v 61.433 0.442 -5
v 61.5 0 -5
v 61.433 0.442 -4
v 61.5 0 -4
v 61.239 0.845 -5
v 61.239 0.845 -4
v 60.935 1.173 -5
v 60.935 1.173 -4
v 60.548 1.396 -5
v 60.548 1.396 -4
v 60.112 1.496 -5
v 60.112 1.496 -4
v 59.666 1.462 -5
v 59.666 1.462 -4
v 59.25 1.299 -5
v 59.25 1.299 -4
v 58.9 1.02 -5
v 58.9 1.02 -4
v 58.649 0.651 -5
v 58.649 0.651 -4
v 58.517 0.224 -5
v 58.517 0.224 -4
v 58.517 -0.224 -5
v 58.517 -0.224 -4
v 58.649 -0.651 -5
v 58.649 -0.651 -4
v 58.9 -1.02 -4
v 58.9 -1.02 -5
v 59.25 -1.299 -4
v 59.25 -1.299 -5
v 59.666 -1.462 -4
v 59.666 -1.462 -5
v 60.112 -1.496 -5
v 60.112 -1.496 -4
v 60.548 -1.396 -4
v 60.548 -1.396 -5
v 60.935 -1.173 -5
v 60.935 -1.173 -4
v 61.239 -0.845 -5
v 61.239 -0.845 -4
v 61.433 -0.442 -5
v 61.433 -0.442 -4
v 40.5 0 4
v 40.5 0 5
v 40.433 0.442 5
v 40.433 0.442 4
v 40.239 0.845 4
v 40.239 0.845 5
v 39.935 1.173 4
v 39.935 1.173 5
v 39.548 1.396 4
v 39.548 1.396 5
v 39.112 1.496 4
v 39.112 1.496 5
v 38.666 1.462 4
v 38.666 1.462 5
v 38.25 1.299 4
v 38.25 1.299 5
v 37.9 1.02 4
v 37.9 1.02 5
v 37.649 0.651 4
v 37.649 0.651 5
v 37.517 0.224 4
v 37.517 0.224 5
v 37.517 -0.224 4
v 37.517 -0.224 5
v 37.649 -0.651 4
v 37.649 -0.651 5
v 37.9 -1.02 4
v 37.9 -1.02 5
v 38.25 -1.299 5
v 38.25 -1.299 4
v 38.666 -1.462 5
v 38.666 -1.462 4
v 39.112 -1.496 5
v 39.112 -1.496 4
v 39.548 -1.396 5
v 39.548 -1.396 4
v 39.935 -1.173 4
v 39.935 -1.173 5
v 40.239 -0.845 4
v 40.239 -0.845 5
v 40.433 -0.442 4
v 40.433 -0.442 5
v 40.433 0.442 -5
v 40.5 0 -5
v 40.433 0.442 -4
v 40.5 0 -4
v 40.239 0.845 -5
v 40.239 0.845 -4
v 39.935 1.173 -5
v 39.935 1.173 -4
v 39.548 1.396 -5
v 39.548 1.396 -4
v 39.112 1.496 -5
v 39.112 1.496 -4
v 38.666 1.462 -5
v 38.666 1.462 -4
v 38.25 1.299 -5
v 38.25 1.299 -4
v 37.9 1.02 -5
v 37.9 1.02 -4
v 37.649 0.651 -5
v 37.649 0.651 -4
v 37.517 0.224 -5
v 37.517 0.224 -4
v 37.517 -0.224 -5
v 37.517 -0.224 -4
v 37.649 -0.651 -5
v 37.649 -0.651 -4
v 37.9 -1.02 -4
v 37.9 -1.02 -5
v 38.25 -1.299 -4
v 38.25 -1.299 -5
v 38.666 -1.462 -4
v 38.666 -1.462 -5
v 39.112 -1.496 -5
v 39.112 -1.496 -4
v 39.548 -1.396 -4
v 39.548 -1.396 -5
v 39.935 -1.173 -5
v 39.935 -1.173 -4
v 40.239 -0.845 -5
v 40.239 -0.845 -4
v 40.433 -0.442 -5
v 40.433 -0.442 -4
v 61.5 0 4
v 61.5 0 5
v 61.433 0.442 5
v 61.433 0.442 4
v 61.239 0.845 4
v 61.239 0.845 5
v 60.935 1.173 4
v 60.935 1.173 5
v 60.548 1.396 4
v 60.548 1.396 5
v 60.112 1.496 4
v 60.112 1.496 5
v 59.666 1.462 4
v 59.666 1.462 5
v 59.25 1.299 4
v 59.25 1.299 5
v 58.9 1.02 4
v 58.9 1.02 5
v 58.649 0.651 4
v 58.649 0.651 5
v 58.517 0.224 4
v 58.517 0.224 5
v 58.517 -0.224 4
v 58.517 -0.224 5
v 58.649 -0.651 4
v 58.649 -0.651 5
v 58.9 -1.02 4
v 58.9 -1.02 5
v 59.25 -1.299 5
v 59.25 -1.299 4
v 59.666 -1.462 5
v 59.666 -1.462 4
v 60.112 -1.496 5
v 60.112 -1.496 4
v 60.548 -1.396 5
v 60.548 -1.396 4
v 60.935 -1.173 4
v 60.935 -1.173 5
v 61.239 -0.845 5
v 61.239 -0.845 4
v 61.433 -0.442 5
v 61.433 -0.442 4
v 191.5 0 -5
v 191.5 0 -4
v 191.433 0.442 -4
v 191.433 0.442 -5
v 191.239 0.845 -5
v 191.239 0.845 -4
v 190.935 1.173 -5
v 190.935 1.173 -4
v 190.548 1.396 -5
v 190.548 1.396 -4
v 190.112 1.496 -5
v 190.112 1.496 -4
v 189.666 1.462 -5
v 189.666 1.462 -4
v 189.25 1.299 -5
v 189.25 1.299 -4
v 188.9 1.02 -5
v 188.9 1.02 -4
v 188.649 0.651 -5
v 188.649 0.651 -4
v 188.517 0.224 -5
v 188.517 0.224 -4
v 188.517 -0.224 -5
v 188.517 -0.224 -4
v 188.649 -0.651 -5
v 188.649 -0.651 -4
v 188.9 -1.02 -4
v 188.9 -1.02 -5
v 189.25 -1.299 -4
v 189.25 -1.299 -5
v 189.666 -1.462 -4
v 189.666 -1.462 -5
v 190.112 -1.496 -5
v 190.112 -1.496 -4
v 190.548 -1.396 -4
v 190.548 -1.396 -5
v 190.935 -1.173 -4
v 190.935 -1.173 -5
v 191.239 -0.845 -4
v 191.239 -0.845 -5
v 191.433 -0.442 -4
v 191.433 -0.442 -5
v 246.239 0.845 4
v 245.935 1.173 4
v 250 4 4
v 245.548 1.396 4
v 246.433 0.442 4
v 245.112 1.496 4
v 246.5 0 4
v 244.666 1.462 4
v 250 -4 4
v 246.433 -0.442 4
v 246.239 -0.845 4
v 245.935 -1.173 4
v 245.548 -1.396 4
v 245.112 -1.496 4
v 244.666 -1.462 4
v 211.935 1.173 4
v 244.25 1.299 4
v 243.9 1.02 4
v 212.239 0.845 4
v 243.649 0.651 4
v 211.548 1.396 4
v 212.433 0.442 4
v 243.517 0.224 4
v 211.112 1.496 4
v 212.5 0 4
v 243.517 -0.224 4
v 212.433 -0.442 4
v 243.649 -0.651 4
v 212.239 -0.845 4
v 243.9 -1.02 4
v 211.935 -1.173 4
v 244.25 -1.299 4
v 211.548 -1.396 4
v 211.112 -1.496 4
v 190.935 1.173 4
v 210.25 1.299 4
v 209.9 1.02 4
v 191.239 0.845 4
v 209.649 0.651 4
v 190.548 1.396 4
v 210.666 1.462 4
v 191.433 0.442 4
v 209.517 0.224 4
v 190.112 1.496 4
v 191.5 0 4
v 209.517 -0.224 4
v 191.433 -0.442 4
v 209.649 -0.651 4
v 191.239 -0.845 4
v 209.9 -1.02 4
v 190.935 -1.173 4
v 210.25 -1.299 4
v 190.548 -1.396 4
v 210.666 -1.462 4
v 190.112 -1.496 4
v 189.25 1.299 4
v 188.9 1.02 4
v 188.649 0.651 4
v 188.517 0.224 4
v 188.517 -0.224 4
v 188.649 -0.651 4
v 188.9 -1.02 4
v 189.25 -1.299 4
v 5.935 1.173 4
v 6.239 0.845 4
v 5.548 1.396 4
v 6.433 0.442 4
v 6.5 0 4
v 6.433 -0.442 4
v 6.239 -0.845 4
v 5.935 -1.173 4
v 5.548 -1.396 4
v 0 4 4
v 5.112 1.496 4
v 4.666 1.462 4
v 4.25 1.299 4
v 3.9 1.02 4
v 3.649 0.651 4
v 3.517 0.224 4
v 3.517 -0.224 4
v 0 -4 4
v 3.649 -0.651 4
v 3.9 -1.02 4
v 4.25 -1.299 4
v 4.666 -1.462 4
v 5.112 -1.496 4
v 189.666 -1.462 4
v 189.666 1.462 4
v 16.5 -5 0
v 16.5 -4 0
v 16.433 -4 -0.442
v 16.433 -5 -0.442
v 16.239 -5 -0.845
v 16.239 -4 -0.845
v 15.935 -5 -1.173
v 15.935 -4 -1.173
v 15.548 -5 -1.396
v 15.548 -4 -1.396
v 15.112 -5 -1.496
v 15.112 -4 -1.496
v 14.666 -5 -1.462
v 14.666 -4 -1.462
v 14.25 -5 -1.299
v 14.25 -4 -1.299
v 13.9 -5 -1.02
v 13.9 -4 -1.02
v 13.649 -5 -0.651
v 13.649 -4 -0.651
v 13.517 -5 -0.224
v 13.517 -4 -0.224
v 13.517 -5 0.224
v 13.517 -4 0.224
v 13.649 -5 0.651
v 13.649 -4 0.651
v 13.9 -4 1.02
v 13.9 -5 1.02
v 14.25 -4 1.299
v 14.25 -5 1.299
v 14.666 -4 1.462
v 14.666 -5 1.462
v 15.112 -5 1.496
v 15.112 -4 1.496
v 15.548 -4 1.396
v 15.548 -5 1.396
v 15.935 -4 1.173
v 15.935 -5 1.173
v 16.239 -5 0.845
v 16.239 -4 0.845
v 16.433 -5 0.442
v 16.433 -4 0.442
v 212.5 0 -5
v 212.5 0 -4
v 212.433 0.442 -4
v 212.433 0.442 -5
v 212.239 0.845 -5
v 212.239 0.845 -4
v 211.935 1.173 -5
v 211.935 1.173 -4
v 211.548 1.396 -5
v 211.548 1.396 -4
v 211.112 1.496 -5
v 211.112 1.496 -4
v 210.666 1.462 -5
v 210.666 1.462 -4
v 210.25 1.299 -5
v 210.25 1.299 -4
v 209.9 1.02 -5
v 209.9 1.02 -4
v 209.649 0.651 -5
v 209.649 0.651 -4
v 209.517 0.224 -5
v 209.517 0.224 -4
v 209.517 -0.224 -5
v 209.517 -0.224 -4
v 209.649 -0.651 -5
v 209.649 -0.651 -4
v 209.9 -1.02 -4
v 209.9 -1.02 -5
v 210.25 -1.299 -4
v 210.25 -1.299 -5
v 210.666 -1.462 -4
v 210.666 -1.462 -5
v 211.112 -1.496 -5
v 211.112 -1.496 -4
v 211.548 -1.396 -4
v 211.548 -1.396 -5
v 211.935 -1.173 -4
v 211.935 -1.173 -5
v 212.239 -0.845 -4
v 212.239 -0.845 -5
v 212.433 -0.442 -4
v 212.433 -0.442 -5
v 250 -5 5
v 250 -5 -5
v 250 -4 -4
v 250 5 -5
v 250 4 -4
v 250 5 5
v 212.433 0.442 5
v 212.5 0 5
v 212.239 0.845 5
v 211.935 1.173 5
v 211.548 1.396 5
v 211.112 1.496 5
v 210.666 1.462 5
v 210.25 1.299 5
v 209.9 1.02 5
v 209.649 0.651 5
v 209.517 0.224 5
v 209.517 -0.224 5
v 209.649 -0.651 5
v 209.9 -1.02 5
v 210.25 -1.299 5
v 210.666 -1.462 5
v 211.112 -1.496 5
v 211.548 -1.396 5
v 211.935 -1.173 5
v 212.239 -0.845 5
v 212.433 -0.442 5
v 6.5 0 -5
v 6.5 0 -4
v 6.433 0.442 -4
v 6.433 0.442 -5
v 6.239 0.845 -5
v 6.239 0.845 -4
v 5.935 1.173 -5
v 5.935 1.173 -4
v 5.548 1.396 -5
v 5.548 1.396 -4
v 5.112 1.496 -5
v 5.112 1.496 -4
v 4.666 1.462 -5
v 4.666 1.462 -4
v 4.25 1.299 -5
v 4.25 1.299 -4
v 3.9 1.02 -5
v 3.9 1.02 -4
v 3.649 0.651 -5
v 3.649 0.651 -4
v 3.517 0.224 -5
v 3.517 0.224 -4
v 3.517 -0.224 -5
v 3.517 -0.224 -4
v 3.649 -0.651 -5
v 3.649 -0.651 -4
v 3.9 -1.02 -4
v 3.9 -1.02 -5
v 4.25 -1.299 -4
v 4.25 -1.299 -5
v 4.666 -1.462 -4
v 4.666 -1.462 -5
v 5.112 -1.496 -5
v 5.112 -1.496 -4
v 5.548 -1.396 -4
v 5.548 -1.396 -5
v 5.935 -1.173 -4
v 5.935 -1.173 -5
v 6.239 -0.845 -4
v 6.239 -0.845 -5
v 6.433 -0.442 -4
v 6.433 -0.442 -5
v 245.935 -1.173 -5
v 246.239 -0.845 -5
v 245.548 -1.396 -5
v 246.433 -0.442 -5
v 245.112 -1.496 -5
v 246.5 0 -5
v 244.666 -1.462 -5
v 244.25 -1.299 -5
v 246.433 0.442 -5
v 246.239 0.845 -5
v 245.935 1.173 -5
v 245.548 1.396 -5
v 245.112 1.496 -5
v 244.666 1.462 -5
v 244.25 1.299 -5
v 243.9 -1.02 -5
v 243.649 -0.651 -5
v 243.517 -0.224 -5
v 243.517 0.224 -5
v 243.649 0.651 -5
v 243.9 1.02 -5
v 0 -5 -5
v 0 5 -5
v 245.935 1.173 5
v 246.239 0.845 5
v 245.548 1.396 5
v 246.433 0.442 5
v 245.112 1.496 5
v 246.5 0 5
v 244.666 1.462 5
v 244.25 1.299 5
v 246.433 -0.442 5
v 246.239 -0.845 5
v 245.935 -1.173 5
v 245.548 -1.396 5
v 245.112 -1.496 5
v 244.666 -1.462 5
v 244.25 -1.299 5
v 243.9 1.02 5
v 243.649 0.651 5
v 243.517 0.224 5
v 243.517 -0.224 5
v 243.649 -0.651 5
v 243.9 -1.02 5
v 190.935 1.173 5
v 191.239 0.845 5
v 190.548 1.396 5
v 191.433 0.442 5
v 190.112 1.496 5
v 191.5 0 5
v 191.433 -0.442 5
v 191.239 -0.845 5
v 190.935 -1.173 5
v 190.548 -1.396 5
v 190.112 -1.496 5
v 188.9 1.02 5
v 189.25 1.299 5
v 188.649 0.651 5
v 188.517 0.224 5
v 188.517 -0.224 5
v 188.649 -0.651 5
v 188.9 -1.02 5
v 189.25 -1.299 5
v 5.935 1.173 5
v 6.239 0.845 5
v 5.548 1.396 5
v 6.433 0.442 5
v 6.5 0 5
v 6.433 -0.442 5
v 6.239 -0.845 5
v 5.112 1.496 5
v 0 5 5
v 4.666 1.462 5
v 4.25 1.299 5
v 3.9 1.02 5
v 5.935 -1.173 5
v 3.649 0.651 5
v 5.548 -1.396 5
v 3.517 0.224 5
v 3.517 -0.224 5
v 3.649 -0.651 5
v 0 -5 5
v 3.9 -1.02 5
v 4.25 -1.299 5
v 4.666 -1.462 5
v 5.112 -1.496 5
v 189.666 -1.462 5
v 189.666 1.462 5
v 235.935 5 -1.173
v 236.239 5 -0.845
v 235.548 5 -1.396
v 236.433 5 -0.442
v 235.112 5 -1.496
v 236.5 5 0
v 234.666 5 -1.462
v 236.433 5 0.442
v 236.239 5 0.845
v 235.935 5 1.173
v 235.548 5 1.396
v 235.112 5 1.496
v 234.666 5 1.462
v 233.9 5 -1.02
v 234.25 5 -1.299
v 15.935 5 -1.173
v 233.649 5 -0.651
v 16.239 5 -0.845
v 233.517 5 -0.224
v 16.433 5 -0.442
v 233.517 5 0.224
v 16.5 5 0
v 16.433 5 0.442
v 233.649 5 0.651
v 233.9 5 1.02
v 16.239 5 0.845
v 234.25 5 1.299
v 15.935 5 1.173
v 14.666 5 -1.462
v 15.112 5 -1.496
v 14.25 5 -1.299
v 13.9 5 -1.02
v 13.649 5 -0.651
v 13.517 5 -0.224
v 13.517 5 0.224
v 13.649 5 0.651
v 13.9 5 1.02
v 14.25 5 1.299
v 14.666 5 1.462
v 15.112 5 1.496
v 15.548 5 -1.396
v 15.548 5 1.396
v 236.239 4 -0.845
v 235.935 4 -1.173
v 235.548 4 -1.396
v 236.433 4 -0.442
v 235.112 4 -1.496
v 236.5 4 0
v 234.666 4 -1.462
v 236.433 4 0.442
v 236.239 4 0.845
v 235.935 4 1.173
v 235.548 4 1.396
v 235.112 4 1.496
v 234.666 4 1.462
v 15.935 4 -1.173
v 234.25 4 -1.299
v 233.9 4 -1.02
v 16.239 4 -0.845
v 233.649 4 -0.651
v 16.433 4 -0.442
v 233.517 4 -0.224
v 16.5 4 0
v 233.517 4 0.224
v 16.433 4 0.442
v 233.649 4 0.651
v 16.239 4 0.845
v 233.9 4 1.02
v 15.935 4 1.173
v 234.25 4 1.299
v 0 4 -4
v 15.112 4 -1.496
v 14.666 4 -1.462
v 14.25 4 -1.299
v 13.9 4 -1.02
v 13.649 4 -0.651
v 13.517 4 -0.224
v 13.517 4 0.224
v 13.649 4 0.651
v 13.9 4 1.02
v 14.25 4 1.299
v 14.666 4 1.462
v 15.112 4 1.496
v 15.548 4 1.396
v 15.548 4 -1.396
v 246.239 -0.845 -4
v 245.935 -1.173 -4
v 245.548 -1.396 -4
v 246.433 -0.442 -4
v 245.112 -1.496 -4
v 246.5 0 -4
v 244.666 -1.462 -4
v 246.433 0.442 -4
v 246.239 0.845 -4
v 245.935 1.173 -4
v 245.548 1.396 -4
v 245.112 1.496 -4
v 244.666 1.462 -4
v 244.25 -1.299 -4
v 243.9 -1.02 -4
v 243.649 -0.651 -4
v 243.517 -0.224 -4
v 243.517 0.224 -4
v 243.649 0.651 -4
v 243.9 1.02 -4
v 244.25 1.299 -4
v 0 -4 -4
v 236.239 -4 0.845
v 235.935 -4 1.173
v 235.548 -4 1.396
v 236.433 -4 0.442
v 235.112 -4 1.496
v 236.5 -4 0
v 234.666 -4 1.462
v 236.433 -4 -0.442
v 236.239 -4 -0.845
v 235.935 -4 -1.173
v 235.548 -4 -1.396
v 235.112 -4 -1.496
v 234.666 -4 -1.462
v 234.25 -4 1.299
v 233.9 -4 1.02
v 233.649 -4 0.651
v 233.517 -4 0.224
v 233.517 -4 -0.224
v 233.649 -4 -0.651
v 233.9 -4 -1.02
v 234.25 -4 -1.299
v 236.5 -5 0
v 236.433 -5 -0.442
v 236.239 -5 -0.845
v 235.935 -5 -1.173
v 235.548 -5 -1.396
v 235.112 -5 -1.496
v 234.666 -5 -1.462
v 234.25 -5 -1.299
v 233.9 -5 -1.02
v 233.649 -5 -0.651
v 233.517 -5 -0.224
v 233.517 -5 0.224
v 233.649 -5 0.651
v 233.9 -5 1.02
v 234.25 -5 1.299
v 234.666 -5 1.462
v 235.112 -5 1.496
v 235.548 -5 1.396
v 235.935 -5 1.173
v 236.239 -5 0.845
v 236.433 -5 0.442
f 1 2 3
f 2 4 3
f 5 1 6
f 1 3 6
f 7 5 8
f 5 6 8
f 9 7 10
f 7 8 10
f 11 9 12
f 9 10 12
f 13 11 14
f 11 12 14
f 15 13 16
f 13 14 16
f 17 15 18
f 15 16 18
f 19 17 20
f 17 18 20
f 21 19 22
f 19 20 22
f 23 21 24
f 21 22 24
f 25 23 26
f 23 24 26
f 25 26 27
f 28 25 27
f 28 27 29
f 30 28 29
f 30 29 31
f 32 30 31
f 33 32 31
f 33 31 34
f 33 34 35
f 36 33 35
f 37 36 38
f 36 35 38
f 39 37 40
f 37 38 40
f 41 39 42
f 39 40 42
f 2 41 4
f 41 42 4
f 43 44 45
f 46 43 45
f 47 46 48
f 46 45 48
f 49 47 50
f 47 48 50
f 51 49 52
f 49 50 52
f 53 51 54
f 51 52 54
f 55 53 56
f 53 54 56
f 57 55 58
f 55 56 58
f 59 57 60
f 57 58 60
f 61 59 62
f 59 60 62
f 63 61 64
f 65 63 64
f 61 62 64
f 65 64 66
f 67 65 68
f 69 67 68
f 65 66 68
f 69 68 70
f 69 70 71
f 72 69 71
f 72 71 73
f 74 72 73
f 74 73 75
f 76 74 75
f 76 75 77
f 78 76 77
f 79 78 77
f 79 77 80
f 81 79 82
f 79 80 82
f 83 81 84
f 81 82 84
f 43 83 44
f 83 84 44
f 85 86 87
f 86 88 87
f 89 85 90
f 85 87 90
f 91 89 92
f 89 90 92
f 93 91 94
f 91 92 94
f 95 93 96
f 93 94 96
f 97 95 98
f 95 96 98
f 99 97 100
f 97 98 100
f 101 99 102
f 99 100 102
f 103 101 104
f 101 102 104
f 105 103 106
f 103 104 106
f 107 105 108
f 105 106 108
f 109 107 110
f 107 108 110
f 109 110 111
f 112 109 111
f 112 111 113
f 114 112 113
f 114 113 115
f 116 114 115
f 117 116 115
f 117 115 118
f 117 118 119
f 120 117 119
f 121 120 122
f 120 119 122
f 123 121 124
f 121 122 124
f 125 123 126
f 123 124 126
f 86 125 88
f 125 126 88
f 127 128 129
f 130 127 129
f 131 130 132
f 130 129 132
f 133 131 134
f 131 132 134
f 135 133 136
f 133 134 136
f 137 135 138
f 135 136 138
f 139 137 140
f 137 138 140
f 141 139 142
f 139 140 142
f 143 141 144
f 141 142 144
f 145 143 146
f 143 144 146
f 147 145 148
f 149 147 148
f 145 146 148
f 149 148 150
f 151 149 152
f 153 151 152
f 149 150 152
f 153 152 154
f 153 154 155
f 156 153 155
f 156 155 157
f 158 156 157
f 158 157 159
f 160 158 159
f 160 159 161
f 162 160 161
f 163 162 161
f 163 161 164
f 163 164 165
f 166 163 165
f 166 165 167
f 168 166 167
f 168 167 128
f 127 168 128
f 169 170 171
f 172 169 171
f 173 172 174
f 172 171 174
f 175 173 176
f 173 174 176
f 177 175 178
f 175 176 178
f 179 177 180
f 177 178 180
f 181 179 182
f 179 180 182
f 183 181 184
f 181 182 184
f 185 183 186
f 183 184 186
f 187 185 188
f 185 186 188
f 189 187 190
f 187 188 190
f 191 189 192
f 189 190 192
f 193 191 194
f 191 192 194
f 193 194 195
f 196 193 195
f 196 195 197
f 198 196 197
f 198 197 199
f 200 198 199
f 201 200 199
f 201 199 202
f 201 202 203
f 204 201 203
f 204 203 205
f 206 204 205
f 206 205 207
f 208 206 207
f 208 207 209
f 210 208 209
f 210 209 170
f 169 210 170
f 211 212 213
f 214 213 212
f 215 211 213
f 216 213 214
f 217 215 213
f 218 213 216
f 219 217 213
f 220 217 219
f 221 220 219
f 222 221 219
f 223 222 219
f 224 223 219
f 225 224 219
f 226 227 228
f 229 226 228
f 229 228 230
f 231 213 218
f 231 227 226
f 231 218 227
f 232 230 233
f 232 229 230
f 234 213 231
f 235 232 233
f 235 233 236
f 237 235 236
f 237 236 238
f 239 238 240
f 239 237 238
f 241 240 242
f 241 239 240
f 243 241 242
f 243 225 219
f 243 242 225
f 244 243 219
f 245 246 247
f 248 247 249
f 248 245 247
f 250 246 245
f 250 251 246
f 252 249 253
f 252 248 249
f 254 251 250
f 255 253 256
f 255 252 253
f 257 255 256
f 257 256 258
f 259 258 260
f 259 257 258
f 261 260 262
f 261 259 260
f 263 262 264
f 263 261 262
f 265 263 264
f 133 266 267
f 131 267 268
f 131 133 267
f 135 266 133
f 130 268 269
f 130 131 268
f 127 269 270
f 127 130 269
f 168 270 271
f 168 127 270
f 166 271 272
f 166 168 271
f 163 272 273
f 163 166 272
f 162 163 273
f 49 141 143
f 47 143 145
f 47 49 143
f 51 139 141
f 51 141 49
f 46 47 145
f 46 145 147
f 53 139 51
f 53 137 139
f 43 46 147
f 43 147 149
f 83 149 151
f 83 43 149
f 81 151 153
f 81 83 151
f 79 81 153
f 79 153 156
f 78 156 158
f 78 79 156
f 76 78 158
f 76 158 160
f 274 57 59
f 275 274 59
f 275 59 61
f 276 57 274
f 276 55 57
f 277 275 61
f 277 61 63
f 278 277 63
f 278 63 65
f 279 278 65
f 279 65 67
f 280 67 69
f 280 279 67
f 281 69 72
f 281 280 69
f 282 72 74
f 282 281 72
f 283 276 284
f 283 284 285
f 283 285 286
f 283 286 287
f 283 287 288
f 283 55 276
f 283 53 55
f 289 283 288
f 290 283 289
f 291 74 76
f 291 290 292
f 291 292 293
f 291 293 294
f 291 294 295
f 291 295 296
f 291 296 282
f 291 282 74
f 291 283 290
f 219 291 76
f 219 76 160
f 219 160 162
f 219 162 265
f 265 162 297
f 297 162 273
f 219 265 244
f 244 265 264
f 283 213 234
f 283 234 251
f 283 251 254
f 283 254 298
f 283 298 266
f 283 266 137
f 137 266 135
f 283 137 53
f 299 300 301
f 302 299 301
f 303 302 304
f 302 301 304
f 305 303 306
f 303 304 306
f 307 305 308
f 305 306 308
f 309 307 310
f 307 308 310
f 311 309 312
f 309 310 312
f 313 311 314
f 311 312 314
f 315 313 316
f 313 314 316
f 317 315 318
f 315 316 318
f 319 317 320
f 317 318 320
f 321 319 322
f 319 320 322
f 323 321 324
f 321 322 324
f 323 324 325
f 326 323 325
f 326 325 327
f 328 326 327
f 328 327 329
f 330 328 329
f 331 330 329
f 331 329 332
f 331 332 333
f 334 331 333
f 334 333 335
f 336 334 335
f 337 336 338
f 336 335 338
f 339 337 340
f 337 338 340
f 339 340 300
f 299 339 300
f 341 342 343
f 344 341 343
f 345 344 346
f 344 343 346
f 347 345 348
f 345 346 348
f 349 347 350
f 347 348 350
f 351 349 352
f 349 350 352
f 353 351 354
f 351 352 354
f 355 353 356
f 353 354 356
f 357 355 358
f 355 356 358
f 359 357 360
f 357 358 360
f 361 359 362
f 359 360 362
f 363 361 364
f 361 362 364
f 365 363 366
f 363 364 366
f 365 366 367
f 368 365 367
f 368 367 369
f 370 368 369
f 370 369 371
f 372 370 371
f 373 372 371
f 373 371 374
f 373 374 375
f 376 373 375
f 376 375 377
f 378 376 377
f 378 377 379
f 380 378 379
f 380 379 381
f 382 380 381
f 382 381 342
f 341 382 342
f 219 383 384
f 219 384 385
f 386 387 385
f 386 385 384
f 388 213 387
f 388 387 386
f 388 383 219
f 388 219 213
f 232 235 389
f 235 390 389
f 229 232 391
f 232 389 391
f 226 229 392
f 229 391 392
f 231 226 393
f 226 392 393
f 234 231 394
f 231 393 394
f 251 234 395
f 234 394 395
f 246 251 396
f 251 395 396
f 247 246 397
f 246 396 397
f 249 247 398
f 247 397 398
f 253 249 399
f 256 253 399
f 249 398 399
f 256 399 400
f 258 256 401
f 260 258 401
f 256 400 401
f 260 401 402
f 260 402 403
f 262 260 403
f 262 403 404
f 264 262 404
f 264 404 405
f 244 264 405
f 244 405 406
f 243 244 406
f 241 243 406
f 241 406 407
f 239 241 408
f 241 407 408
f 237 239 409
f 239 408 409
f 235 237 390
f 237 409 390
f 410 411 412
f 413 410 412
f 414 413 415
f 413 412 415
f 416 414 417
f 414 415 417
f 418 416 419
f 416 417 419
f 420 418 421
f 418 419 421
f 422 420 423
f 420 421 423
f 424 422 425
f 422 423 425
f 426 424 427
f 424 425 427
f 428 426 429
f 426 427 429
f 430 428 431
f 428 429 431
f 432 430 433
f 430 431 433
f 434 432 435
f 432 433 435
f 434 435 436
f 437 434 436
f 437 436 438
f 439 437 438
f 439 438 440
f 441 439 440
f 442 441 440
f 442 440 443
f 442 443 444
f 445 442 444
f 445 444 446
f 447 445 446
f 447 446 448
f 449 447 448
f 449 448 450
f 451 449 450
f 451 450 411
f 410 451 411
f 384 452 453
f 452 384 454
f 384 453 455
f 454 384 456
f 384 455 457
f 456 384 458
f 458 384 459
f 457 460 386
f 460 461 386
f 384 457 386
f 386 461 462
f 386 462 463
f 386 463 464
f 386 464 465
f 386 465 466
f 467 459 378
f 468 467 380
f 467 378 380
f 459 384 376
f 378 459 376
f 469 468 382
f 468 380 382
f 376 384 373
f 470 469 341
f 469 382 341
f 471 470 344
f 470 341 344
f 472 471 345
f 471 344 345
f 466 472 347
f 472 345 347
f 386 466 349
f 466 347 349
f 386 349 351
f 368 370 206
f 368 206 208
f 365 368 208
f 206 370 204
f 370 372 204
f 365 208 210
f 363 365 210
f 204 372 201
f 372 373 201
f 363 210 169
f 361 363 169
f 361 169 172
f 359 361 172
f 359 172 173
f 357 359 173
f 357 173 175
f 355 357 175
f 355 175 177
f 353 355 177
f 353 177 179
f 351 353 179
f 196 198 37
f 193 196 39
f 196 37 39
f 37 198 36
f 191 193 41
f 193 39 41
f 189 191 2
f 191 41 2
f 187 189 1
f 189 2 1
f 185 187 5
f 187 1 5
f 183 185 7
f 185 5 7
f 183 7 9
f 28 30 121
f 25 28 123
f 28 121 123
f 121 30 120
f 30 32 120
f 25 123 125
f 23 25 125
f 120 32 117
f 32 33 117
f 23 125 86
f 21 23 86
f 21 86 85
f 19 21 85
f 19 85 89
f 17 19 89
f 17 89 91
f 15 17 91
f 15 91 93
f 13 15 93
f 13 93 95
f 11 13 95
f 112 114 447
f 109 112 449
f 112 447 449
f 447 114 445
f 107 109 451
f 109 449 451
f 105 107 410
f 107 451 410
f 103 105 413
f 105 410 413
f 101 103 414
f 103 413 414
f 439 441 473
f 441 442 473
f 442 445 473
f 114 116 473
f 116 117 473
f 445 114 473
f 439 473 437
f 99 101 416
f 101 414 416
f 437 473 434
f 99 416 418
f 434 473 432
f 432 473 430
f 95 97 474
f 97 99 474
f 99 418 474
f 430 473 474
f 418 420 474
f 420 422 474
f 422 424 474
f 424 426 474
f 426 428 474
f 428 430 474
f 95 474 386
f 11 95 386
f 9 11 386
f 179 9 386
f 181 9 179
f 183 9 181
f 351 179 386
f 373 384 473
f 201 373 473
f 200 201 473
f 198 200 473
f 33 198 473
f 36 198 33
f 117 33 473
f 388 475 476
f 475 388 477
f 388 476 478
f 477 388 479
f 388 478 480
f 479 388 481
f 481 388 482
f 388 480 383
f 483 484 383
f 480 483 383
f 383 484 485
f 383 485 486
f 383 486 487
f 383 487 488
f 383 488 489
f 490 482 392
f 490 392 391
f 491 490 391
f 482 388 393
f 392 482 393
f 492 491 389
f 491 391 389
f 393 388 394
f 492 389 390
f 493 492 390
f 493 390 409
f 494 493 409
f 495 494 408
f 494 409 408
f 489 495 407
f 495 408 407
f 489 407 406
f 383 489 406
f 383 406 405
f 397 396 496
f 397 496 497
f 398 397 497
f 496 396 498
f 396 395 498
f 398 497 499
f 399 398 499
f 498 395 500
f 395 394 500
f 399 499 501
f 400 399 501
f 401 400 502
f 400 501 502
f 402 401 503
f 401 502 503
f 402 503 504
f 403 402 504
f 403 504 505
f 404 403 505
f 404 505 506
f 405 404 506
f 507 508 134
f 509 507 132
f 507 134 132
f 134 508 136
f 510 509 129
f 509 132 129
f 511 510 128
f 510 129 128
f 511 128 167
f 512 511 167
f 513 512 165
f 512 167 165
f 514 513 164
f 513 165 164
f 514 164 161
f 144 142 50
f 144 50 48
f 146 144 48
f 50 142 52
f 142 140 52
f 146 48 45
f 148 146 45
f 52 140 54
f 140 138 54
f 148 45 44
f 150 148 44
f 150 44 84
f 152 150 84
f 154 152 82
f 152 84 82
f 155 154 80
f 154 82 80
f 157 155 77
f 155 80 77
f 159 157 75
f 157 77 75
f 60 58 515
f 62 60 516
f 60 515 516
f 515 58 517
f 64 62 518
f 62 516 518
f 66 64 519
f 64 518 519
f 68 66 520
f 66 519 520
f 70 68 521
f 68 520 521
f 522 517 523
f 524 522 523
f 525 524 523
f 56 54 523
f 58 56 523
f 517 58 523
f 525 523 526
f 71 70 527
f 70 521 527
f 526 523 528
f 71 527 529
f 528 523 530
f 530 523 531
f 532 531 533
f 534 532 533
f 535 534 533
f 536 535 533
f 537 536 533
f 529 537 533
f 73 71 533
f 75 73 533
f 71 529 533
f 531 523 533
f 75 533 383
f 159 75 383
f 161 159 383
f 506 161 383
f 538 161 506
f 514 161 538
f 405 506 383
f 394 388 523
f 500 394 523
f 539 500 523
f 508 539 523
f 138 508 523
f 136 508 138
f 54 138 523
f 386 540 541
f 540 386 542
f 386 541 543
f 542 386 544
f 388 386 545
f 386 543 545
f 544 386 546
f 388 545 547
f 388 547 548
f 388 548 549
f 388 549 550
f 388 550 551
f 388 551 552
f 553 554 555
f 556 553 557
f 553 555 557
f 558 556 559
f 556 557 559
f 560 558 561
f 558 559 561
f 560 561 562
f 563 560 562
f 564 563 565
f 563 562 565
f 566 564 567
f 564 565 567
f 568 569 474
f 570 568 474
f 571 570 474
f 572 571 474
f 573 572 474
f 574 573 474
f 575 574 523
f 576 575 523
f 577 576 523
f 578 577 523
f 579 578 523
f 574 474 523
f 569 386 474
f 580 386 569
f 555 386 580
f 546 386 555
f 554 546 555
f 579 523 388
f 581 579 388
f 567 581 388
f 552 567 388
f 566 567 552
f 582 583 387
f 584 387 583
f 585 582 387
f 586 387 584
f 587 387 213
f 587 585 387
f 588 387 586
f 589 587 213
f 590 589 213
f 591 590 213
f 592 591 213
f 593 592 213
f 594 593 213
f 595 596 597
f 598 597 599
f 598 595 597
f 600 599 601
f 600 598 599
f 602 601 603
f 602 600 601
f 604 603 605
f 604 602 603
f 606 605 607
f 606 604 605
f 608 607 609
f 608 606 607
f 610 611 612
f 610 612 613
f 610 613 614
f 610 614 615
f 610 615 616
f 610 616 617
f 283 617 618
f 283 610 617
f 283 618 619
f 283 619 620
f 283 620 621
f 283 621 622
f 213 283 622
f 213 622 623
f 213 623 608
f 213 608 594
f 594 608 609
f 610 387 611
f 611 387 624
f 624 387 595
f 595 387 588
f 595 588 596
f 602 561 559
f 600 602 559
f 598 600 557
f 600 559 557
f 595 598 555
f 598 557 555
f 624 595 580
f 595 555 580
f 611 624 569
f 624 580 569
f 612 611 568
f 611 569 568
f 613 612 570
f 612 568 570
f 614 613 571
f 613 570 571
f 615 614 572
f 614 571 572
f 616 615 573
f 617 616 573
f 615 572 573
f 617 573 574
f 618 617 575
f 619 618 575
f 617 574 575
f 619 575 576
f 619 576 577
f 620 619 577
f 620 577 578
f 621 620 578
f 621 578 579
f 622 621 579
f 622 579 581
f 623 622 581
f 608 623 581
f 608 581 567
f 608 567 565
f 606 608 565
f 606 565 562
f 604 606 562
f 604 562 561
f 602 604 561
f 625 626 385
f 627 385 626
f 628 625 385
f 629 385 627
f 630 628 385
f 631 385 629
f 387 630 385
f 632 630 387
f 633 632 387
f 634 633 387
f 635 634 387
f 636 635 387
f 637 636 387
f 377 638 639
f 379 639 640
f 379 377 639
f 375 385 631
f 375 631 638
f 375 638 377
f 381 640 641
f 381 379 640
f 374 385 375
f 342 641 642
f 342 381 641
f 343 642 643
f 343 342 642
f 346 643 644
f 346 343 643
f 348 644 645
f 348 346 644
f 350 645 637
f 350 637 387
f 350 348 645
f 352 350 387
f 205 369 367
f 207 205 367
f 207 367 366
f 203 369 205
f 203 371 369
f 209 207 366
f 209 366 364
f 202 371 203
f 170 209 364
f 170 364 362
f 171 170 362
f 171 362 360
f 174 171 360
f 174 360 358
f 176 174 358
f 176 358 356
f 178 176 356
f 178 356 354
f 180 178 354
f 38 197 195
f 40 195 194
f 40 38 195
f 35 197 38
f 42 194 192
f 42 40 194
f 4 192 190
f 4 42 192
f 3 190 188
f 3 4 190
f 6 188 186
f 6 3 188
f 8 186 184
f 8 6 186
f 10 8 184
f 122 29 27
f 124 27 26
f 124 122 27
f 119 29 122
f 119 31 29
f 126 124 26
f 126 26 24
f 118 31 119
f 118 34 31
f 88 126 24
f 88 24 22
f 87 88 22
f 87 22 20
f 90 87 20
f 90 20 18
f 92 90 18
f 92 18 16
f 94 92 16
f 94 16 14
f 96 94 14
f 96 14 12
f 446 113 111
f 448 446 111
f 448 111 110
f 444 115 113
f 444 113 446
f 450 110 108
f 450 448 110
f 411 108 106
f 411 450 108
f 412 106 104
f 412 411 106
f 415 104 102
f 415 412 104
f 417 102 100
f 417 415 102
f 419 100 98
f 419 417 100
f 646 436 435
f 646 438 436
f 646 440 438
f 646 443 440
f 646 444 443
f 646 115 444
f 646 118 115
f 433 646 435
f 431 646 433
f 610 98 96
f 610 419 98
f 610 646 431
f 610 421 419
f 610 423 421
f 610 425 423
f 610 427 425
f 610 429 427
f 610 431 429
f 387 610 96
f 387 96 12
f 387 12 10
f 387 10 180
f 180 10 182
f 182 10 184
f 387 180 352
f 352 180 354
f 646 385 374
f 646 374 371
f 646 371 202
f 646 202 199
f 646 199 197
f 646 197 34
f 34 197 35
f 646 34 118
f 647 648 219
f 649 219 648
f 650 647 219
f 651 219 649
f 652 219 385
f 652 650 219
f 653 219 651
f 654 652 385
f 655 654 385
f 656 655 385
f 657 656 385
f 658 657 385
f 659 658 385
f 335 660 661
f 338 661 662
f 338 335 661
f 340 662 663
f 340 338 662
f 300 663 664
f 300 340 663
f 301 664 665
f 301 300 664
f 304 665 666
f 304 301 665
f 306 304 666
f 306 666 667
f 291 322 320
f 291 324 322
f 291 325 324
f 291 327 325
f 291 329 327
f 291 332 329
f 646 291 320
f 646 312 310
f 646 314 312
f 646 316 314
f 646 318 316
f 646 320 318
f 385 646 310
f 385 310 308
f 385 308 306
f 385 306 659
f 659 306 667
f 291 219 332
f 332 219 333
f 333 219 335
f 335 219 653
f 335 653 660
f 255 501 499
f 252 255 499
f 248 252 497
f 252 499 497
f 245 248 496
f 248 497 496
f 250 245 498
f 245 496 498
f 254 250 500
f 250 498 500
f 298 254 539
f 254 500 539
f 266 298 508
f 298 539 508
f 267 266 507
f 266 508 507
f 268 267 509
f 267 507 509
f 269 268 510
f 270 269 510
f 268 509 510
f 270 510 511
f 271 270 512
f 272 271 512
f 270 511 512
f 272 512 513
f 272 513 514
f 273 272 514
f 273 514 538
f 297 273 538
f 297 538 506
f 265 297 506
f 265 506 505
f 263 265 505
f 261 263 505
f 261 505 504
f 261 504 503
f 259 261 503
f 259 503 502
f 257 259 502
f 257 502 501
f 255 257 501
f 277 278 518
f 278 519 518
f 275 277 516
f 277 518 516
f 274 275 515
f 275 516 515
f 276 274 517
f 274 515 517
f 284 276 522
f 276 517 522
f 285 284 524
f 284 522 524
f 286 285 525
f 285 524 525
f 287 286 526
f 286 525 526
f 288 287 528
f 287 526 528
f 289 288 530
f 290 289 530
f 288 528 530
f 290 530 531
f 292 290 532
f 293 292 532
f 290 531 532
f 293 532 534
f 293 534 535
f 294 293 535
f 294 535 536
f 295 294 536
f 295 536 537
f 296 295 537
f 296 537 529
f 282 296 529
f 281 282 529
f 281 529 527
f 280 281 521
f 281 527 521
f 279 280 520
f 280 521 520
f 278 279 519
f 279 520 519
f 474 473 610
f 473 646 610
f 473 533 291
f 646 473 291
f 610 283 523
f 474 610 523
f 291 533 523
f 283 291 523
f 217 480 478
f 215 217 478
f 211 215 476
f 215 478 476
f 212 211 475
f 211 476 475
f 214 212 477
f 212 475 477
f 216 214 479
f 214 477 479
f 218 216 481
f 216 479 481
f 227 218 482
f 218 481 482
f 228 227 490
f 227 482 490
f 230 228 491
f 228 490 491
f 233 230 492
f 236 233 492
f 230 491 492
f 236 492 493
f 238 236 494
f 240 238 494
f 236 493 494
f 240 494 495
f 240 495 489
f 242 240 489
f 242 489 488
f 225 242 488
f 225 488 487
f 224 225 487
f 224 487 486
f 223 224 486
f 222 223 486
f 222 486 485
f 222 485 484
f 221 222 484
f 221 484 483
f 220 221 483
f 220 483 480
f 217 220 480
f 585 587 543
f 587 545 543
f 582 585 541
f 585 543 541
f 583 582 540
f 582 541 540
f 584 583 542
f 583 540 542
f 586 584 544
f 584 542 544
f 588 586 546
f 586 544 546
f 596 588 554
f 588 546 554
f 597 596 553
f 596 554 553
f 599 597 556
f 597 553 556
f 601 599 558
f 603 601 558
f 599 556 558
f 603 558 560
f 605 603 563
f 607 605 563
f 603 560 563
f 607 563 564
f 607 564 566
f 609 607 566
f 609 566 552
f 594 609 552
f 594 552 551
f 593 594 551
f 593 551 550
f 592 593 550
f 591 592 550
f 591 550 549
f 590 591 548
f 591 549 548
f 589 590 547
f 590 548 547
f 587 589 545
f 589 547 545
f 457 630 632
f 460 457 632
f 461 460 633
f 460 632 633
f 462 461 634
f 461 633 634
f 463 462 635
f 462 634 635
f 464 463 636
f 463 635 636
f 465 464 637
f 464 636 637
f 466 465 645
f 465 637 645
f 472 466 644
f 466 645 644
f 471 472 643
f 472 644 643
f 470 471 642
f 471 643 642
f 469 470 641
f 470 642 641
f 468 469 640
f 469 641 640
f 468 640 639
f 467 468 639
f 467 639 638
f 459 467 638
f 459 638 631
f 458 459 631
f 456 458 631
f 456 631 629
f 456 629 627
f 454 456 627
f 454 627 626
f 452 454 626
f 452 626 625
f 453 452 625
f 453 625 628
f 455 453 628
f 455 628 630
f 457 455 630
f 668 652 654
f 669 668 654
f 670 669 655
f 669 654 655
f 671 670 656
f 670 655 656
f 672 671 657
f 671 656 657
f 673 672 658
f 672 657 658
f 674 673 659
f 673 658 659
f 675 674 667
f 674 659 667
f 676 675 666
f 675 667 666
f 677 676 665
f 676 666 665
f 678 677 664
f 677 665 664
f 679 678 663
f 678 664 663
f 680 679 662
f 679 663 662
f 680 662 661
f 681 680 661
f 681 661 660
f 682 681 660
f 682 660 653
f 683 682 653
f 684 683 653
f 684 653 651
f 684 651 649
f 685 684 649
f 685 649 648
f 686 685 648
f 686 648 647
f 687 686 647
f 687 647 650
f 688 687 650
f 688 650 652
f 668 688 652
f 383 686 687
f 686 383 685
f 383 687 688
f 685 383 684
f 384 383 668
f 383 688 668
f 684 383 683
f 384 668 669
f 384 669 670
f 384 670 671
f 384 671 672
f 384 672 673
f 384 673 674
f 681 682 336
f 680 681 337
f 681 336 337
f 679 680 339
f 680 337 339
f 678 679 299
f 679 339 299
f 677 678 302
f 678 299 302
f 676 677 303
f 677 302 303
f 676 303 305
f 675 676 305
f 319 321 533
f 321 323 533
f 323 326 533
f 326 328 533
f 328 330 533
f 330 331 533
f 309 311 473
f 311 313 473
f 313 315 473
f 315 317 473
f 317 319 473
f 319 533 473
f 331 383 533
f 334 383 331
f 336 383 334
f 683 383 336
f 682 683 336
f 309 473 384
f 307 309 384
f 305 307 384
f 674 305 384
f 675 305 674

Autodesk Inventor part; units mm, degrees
ref_plane "YZ Plane" through (0, 0, 0) normal (1, 0, 0) x (0, 1, 0)
ref_plane "XZ Plane" through (0, 0, 0) normal (0, 1, 0) x (-1, 0, 0)
ref_plane "XY Plane" through (0, 0, 0) normal (0, 0, 1) x (1, 0, 0)
sketch "スケッチ1" plane through (0, 0, 0) normal (1, 0, 0) x (0, 1, 0)
  line L0 (5, 5) -> (-5, 5)
  line L1 (-5, 5) -> (-5, -5)
  line L2 (-5, -5) -> (5, -5)
  line L3 (5, -5) -> (5, 5)
  line L4 (4, 4) -> (-4, 4)
  line L5 (-4, 4) -> (-4, -4)
  line L6 (-4, -4) -> (4, -4)
  line L7 (4, -4) -> (4, 4)
  point P0 (0, 0)
  dimension "d0" = 1
  dimension "d1" = 1
  dimension "d2" = 1
  dimension "d3" = 1
  dimension "d4" = 10
  dimension "d5" = 10
  dimension "d6" = 5
  dimension "d7" = 5
extrude "押し出し1" add sketch "スケッチ1" along normal blind 250
sketch "スケッチ2" plane through (0, -5, 5) normal (0, 0, 1) x (1, 0, 0)
  circle A0 centre (60, 5) radius 1.5
  circle A1 centre (190, 5) radius 1.5
  line L0 (250, 10) -> (250, 0) projected
  line L1 (0, 10) -> (0, 0) projected
  line L2 (0, 0) -> (250, 0) projected
  point P0 (0, 5)
  dimension "d10" = 60
  dimension "d11" = 3
  dimension "d12" = 3
  dimension "d13" = 60
  dimension "d14" = 5
extrude "押し出し2" cut sketch "スケッチ2" against normal blind 200
sketch "スケッチ3" plane through (0, -5, 5) normal (0, 0, 1) x (1, 0, 0)
  circle A0 centre (5, 5) radius 1.5
  circle A1 centre (245, 5) radius 1.5
  line L0 (250, 10) -> (250, 0) projected
  line L1 (0, 10) -> (250, 10) projected
  line L2 (0, 10) -> (0, 0) projected
  point P0 (0, 5)
  dimension "d17" = 5
  dimension "d18" = 5
  dimension "d19" = 3
  dimension "d20" = 5
  dimension "d21" = 5
  dimension "d22" = 3
extrude "押し出し3" cut sketch "スケッチ3" against normal blind 200
sketch "スケッチ4" plane through (0, -5, 5) normal (0, 0, 1) x (1, 0, 0)
  circle A0 centre (39, 5) radius 1.5
  circle A1 centre (60, 5) radius 1.5 projected
  circle A2 centre (211, 5) radius 1.5
  circle A3 centre (190, 5) radius 1.5 projected
  point P0 (0, 5)
  dimension "d25" = 3
  dimension "d26" = 21
  dimension "d27" = 3
  dimension "d28" = 21
extrude "押し出し4" cut sketch "スケッチ4" against normal blind 200 contours A0 | A2
sketch "スケッチ5" plane through (0, 5, 5) normal (0, 1, 0) x (1, 0, 0)
  circle A0 centre (15, 5) radius 1.5
  line L0 (0, 10) -> (250, 10) projected
  line L1 (0, 10) -> (0, 0) projected
  circle A1 centre (235, 5) radius 1.5
  line L2 (250, 10) -> (250, 0) projected
  line L3 (0, 0) -> (250, 0) projected
  point P0 (0, 5)
  dimension "d31" = 3
  dimension "d32" = 5
  dimension "d33" = 15
  dimension "d34" = 15
  dimension "d35" = 5
  dimension "d36" = 3
extrude "押し出し5" cut sketch "スケッチ5" against normal blind 200 contours A0 | A1
properties part number "f&bparts" material "アルミニウム 6061"
